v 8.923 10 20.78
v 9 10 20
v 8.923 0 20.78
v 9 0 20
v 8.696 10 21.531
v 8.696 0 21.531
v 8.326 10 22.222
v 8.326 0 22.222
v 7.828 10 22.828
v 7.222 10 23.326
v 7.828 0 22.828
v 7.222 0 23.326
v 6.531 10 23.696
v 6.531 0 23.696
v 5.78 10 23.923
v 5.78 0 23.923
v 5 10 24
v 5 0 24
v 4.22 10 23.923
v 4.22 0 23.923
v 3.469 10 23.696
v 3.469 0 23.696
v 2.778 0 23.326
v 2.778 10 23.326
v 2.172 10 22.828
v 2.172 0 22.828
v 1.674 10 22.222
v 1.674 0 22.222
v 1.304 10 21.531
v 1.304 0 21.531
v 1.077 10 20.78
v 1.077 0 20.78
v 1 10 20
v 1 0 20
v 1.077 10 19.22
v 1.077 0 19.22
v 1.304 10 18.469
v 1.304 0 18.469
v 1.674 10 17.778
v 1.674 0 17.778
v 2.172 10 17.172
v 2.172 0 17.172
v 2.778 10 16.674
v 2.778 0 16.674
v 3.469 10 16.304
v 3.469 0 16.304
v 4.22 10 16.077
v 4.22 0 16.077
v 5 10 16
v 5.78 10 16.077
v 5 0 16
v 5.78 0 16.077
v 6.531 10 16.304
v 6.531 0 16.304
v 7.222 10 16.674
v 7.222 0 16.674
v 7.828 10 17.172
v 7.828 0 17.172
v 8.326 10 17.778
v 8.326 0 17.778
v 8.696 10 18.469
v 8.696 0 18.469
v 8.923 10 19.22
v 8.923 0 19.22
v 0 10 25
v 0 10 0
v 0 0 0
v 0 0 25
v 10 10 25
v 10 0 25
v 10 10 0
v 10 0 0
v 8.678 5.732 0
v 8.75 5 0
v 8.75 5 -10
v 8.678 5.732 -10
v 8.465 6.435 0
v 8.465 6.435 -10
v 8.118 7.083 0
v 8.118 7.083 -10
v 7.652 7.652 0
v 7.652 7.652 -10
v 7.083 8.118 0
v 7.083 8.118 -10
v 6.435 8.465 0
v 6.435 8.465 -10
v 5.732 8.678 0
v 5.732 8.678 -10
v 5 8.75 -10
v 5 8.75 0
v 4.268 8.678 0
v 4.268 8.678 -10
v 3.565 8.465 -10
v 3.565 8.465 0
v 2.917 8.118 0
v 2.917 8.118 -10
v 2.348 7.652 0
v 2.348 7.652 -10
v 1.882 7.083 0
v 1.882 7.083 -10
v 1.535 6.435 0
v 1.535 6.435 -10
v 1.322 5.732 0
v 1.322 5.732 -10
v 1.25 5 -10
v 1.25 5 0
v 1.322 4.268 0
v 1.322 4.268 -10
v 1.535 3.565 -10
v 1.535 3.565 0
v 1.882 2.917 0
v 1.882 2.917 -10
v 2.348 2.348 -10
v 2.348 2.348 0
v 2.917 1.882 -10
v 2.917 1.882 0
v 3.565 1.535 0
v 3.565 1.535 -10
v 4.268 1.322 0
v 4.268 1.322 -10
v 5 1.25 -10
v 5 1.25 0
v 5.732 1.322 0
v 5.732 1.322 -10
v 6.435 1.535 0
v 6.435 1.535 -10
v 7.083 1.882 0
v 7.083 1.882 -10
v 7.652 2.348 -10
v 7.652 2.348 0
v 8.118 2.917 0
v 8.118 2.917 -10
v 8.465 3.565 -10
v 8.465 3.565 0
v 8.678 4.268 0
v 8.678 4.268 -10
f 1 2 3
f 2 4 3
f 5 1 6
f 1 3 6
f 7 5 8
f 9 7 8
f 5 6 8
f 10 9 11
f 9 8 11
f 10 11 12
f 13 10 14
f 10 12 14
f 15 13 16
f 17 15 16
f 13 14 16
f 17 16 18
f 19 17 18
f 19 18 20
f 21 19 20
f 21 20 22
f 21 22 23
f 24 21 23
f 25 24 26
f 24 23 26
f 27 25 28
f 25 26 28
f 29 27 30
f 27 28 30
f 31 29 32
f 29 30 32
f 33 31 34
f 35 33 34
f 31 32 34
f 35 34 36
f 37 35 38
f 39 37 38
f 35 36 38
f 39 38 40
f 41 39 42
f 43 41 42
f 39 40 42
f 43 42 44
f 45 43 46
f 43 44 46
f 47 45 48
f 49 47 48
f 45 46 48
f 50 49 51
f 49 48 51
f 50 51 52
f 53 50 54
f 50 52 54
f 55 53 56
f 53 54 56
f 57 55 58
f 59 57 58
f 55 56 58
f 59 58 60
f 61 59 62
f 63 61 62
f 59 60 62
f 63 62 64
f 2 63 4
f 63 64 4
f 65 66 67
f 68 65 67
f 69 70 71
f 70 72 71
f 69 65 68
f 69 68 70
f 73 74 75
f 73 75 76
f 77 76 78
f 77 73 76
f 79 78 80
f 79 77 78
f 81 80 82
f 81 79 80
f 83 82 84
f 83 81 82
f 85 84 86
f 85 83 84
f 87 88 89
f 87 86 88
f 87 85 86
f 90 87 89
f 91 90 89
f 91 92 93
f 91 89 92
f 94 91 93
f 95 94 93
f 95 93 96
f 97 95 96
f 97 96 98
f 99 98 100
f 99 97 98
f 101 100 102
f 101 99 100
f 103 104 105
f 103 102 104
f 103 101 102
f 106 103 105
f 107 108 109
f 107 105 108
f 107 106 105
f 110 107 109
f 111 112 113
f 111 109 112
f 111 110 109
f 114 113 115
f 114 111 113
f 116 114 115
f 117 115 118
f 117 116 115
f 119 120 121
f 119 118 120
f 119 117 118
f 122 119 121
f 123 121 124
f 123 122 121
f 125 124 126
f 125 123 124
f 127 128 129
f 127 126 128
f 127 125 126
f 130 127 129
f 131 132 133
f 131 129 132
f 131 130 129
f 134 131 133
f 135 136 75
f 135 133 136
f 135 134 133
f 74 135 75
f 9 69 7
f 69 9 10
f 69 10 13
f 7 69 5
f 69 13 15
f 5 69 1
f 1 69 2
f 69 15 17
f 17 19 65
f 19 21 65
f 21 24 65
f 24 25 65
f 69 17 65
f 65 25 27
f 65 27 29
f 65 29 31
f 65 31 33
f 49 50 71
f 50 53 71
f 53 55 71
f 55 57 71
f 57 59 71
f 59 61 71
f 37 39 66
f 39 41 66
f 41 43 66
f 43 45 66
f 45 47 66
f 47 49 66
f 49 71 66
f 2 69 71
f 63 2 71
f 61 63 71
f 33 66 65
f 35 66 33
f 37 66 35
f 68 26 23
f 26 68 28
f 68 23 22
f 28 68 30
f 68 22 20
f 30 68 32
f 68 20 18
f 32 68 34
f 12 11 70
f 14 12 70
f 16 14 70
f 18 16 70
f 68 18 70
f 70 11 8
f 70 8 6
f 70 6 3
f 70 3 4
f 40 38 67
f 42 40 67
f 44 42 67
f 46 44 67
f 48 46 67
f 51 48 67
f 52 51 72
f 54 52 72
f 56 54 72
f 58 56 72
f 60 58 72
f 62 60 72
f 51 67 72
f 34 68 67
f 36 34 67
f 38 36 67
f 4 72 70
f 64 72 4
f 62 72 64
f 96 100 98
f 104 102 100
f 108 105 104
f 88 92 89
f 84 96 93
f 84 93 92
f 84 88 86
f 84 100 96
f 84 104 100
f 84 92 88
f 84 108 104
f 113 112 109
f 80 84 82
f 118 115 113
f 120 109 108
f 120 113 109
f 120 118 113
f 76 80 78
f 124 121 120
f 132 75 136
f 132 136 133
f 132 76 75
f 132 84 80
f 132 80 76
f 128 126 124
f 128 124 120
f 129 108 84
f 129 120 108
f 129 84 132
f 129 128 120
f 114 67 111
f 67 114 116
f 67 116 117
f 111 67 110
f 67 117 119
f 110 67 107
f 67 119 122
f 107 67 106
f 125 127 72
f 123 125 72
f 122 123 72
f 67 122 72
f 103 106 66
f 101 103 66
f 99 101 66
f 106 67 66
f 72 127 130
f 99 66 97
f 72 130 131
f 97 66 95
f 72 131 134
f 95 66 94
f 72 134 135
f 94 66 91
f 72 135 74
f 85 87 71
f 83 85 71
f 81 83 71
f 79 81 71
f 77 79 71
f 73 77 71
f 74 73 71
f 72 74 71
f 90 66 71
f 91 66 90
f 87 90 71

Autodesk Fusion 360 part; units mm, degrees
sketch "Sketch1" plane through (0, 0, 0) normal (0, 0, 1) x (1, 0, 0)
  line L0 (0, 0) -> (10, 0)
  line L1 (10, 0) -> (10, 10)
  line L2 (10, 10) -> (0, 10)
  line L3 (0, 10) -> (0, 0)
  dimension "d1" = 10
  dimension "d2" = 10
extrude "Extrude1" add sketch "Sketch1" along normal blind 25
sketch "Sketch2" plane through (0, 0, 0) normal (0, -1, 0) x (1, 0, 0)
  line L0 (0, 0) -> (10, 0)
  line L1 (10, 0) -> (10, 25)
  line L2 (10, 25) -> (0, 25)
  line L3 (0, 25) -> (0, 0)
  circle A0 centre (5, 20) radius 4
  dimension "d5" = 8
extrude "Extrude2" cut sketch "Sketch2" against normal blind 10 contours A0
sketch "Sketch3" plane through (0, 0, 0) normal (0, 0, -1) x (1, 0, 0)
  line L0 (0, 0) -> (0, -10)
  line L1 (0, -10) -> (10, -10)
  line L2 (10, -10) -> (10, 0)
  line L3 (10, 0) -> (0, 0)
  circle A0 centre (5, -5) radius 3.75
  dimension "d8" = 7.5
extrude "Extrude3" add sketch "Sketch3" along normal blind 10 contours A0
